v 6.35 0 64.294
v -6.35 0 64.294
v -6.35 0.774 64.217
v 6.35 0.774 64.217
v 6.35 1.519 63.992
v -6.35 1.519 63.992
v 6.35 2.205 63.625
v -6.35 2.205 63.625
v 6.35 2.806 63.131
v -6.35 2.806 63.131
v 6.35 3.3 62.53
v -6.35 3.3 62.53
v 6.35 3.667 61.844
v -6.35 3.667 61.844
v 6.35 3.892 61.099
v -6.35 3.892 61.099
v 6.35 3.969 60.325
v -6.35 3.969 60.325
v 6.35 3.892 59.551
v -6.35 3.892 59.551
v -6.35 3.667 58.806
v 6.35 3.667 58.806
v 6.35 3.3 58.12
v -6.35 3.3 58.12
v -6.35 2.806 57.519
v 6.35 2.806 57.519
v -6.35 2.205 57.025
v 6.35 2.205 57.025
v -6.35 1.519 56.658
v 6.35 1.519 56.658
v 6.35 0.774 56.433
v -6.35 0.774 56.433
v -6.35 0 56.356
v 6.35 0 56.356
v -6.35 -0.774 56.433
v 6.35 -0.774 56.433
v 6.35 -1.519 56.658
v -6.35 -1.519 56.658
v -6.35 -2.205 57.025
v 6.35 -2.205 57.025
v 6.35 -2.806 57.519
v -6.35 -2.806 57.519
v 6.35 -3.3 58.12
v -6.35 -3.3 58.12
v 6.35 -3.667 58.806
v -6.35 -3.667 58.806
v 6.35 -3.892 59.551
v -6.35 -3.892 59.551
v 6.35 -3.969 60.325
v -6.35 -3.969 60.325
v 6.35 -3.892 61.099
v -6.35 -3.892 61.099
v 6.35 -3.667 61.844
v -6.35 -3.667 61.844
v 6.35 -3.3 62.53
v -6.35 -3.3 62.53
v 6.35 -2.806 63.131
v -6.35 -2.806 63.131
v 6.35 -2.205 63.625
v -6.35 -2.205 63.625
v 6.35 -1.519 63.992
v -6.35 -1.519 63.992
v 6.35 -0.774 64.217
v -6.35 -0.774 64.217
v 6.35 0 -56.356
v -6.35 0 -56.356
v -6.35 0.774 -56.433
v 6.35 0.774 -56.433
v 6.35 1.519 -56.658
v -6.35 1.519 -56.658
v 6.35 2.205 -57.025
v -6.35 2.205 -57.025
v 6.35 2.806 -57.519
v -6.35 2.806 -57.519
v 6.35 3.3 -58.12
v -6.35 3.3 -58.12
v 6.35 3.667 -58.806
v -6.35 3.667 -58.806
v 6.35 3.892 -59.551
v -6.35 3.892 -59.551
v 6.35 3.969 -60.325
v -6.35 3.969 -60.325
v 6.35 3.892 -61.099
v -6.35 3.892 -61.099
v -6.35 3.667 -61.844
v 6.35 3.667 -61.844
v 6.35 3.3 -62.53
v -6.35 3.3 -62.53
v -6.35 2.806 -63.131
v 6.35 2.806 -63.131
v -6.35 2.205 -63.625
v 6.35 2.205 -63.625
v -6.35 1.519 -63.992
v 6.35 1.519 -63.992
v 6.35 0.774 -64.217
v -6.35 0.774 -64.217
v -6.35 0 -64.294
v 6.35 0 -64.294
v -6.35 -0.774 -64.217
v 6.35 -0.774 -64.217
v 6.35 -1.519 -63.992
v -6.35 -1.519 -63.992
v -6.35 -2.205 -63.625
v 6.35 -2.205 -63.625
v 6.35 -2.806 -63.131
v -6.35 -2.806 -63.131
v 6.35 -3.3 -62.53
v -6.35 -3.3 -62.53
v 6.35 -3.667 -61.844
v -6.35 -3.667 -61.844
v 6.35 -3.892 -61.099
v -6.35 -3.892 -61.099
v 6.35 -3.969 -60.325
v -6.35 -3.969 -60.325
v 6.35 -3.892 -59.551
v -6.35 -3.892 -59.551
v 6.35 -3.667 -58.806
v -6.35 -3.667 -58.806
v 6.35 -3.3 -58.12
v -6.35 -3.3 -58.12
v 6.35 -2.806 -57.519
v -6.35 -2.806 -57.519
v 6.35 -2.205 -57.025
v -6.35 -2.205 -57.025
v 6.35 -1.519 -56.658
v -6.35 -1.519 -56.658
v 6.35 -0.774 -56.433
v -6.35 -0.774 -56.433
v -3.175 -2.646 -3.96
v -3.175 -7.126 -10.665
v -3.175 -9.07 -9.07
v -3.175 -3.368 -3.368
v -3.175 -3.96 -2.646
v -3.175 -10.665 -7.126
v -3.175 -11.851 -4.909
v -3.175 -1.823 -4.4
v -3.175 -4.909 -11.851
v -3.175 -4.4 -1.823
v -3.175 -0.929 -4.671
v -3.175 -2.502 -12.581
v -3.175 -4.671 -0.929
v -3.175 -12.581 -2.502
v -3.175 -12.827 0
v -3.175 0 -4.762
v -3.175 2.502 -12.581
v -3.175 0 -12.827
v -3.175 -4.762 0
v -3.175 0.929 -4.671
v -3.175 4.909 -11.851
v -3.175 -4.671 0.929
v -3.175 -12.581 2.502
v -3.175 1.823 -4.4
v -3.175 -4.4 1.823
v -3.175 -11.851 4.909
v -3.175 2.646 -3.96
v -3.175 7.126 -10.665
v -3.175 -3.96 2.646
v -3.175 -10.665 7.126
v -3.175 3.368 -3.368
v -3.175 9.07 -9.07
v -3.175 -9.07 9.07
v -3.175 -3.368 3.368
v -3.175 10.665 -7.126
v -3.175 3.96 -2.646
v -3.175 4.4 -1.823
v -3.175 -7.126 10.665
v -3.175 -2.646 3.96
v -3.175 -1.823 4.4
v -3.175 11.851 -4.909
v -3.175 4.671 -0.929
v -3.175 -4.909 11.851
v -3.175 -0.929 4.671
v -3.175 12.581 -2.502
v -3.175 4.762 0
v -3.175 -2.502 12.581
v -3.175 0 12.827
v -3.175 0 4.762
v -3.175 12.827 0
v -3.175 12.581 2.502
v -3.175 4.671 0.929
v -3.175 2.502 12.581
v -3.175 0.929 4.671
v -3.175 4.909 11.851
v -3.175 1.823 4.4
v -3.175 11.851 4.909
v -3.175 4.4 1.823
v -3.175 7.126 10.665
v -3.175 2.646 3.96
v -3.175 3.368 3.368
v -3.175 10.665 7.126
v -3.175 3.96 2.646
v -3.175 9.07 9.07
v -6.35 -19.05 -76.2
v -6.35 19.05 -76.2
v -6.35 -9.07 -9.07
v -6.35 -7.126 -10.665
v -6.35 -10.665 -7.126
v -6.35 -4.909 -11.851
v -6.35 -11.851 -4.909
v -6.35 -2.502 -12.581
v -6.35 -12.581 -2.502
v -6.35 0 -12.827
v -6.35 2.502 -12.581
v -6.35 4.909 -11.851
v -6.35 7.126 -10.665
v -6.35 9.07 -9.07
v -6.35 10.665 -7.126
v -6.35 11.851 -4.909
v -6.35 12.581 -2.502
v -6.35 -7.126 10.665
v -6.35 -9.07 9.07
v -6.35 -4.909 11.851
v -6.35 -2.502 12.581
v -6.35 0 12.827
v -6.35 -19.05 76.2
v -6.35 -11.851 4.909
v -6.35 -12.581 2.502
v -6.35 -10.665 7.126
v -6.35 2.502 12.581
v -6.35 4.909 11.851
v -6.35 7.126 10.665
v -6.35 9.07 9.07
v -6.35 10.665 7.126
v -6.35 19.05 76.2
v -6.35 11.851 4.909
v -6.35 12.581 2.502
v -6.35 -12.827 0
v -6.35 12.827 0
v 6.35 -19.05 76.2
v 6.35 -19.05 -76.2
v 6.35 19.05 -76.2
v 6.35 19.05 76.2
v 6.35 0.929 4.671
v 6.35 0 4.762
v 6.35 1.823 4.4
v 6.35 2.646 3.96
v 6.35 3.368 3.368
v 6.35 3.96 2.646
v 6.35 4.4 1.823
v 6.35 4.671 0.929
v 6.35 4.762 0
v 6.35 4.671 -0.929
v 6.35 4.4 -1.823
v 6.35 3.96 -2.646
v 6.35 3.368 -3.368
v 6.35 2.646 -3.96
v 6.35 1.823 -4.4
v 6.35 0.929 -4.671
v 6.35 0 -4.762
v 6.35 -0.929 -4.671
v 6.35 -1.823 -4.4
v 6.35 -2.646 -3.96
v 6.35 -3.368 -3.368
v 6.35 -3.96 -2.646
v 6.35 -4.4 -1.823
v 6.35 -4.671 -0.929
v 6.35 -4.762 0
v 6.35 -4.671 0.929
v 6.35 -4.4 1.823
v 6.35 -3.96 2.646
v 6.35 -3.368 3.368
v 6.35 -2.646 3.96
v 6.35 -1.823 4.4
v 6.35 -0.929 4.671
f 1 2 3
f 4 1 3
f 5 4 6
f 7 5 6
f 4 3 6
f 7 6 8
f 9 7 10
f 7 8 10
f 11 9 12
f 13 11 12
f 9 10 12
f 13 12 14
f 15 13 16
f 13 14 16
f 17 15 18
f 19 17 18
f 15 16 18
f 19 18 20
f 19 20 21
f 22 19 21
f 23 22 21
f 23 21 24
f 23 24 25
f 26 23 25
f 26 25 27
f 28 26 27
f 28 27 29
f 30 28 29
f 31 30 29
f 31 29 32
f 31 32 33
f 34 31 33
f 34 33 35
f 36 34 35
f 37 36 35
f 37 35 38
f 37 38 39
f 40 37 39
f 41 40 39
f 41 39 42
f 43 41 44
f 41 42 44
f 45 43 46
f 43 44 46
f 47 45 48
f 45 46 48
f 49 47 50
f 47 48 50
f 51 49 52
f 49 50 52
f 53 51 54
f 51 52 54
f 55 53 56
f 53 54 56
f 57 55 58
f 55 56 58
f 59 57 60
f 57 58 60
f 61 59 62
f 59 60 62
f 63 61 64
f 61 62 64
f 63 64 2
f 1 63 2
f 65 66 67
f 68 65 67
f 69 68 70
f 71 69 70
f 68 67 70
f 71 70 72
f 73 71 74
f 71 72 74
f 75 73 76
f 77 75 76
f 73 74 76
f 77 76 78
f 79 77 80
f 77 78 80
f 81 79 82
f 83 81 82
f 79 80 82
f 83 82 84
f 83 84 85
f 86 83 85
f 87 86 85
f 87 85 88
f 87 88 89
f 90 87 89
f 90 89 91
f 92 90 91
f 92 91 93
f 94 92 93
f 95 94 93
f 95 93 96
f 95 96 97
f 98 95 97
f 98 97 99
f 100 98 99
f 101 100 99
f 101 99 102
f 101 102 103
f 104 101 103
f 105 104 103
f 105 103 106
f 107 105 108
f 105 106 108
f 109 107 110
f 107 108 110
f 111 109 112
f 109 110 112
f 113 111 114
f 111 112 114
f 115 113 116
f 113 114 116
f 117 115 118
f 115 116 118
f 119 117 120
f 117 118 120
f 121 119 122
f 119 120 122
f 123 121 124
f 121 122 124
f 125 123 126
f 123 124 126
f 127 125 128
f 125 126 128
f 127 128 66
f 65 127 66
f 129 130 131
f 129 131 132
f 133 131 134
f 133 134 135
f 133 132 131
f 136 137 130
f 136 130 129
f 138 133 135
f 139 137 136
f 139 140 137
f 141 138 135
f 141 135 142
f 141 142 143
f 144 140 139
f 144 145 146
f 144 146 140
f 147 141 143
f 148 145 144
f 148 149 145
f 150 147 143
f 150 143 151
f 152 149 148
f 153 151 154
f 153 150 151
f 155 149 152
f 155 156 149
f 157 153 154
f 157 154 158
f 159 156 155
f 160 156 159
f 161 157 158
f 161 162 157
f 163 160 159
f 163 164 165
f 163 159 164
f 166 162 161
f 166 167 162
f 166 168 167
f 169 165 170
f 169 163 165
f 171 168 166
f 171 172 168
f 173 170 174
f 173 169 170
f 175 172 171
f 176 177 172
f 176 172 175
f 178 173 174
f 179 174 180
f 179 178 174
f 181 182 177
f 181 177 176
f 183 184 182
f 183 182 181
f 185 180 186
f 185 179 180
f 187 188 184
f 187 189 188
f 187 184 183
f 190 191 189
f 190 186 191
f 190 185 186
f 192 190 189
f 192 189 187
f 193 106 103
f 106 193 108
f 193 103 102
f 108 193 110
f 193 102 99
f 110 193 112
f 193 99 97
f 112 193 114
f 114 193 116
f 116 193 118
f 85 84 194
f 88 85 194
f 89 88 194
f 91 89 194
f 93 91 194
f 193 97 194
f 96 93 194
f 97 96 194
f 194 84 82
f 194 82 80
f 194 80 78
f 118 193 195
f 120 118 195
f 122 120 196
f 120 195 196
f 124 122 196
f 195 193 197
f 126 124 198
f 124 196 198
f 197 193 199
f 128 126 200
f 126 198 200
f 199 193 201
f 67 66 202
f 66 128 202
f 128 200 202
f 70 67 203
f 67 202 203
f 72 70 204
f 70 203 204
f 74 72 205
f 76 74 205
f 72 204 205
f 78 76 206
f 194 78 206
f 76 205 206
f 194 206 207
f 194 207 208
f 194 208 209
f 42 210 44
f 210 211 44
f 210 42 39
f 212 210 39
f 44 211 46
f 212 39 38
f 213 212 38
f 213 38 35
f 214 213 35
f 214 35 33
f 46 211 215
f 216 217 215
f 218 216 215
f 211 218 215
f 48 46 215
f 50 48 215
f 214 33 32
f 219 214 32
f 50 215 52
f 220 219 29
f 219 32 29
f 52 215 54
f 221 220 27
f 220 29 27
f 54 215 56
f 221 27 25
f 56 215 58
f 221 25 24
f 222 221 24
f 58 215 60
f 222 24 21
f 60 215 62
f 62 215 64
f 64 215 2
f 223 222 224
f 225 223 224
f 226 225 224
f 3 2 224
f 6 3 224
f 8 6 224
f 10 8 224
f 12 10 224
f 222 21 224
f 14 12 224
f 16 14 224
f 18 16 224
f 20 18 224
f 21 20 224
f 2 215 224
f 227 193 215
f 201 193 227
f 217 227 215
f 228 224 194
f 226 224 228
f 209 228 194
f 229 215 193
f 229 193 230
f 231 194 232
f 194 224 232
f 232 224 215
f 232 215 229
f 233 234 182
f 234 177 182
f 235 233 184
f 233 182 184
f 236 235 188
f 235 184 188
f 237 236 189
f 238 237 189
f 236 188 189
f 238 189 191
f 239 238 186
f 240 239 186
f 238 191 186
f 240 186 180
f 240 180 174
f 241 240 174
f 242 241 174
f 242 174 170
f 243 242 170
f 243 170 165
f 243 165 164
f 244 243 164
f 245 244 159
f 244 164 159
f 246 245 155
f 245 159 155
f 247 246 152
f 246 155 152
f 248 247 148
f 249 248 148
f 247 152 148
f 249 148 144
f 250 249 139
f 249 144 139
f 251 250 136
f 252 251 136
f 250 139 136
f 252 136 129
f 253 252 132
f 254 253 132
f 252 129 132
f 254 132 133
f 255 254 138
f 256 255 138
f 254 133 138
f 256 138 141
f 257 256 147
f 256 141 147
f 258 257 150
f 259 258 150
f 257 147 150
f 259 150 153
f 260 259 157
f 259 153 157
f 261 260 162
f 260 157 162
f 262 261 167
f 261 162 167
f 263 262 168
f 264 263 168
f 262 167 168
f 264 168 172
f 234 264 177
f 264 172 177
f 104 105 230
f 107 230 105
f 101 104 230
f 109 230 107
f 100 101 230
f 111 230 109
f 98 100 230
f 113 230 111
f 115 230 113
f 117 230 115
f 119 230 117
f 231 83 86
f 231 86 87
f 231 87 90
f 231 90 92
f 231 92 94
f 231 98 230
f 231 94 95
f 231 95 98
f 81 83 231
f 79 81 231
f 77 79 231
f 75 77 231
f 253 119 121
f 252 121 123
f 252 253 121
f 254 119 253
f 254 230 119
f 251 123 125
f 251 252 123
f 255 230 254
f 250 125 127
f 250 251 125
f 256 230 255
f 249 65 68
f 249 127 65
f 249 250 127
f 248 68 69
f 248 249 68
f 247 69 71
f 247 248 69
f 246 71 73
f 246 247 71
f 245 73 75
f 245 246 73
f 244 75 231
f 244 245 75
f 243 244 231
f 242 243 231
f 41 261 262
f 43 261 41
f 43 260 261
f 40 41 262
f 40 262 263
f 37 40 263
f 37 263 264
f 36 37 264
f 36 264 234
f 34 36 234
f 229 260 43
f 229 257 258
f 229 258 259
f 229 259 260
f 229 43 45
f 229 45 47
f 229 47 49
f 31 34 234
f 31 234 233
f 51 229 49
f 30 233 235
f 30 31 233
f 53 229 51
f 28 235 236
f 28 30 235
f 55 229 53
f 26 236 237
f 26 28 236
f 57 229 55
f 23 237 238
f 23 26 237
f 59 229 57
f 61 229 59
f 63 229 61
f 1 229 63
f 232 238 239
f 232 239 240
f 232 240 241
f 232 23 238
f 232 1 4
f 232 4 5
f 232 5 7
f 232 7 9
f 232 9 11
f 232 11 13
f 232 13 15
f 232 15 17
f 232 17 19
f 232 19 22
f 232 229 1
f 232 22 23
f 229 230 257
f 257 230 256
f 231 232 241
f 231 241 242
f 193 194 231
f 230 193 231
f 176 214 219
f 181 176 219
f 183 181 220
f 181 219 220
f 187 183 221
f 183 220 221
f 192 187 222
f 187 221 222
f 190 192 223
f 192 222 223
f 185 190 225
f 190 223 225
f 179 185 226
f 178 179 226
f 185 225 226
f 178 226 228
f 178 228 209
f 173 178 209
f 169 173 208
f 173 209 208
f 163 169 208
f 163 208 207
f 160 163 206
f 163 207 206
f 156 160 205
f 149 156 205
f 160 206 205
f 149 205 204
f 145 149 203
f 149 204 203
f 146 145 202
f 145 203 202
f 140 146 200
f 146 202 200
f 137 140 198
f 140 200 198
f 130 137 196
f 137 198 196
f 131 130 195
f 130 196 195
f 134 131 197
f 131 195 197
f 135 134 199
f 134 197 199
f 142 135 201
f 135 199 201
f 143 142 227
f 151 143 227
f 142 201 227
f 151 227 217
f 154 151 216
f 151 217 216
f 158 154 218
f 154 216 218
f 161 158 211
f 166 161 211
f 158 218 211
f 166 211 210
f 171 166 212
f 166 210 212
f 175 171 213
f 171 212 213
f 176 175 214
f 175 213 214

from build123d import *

# Parameters (mm, degrees)
SKETCH1_W                        = 12.7
SKETCH1_H                        = 38.1
EXTRUDE1_DEPTH                   = 76.2
F_3_8_16_TAPPED_HOLE1_D          = 7.9375
F_3_8_16_TAPPED_HOLE1_DEPTH      = 12.7
F_3_8_0_375_DIAMETER_HOLE1_D     = 9.525
F_3_8_0_375_DIAMETER_HOLE1_DEPTH = 12.7
SKETCH6_R                        = 12.827
EXTRUDE2_DEPTH                   = 3.175


with BuildPart() as part:
    # Sketch1 → Extrude1 (new body, symmetric)
    with BuildSketch(Plane.XY):
        Rectangle(SKETCH1_W, SKETCH1_H)
    extrude(amount=EXTRUDE1_DEPTH, both=True)

    # 3/8-16 Tapped Hole1
    with Locations(Plane(origin=(6.35, 0, 0), x_dir=(0, 0, -1), z_dir=(1, 0, 0))):
        with Locations((-60.325, 0), (60.325, 0)):
            Hole(F_3_8_16_TAPPED_HOLE1_D / 2, depth=F_3_8_16_TAPPED_HOLE1_DEPTH)

    # 3/8 (0.375) Diameter Hole1
    with Locations(Plane(origin=(6.35, 0, 0), x_dir=(0, 0, -1), z_dir=(1, 0, 0))):
        with Locations((0, 0)):
            Hole(F_3_8_0_375_DIAMETER_HOLE1_D / 2, depth=F_3_8_0_375_DIAMETER_HOLE1_DEPTH)

    # Sketch6 → Extrude2 (cut)
    with BuildSketch(Plane.ZY.offset(6.35)):
        Circle(SKETCH6_R)
    extrude(amount=-EXTRUDE2_DEPTH, mode=Mode.SUBTRACT)


solid = part.part
